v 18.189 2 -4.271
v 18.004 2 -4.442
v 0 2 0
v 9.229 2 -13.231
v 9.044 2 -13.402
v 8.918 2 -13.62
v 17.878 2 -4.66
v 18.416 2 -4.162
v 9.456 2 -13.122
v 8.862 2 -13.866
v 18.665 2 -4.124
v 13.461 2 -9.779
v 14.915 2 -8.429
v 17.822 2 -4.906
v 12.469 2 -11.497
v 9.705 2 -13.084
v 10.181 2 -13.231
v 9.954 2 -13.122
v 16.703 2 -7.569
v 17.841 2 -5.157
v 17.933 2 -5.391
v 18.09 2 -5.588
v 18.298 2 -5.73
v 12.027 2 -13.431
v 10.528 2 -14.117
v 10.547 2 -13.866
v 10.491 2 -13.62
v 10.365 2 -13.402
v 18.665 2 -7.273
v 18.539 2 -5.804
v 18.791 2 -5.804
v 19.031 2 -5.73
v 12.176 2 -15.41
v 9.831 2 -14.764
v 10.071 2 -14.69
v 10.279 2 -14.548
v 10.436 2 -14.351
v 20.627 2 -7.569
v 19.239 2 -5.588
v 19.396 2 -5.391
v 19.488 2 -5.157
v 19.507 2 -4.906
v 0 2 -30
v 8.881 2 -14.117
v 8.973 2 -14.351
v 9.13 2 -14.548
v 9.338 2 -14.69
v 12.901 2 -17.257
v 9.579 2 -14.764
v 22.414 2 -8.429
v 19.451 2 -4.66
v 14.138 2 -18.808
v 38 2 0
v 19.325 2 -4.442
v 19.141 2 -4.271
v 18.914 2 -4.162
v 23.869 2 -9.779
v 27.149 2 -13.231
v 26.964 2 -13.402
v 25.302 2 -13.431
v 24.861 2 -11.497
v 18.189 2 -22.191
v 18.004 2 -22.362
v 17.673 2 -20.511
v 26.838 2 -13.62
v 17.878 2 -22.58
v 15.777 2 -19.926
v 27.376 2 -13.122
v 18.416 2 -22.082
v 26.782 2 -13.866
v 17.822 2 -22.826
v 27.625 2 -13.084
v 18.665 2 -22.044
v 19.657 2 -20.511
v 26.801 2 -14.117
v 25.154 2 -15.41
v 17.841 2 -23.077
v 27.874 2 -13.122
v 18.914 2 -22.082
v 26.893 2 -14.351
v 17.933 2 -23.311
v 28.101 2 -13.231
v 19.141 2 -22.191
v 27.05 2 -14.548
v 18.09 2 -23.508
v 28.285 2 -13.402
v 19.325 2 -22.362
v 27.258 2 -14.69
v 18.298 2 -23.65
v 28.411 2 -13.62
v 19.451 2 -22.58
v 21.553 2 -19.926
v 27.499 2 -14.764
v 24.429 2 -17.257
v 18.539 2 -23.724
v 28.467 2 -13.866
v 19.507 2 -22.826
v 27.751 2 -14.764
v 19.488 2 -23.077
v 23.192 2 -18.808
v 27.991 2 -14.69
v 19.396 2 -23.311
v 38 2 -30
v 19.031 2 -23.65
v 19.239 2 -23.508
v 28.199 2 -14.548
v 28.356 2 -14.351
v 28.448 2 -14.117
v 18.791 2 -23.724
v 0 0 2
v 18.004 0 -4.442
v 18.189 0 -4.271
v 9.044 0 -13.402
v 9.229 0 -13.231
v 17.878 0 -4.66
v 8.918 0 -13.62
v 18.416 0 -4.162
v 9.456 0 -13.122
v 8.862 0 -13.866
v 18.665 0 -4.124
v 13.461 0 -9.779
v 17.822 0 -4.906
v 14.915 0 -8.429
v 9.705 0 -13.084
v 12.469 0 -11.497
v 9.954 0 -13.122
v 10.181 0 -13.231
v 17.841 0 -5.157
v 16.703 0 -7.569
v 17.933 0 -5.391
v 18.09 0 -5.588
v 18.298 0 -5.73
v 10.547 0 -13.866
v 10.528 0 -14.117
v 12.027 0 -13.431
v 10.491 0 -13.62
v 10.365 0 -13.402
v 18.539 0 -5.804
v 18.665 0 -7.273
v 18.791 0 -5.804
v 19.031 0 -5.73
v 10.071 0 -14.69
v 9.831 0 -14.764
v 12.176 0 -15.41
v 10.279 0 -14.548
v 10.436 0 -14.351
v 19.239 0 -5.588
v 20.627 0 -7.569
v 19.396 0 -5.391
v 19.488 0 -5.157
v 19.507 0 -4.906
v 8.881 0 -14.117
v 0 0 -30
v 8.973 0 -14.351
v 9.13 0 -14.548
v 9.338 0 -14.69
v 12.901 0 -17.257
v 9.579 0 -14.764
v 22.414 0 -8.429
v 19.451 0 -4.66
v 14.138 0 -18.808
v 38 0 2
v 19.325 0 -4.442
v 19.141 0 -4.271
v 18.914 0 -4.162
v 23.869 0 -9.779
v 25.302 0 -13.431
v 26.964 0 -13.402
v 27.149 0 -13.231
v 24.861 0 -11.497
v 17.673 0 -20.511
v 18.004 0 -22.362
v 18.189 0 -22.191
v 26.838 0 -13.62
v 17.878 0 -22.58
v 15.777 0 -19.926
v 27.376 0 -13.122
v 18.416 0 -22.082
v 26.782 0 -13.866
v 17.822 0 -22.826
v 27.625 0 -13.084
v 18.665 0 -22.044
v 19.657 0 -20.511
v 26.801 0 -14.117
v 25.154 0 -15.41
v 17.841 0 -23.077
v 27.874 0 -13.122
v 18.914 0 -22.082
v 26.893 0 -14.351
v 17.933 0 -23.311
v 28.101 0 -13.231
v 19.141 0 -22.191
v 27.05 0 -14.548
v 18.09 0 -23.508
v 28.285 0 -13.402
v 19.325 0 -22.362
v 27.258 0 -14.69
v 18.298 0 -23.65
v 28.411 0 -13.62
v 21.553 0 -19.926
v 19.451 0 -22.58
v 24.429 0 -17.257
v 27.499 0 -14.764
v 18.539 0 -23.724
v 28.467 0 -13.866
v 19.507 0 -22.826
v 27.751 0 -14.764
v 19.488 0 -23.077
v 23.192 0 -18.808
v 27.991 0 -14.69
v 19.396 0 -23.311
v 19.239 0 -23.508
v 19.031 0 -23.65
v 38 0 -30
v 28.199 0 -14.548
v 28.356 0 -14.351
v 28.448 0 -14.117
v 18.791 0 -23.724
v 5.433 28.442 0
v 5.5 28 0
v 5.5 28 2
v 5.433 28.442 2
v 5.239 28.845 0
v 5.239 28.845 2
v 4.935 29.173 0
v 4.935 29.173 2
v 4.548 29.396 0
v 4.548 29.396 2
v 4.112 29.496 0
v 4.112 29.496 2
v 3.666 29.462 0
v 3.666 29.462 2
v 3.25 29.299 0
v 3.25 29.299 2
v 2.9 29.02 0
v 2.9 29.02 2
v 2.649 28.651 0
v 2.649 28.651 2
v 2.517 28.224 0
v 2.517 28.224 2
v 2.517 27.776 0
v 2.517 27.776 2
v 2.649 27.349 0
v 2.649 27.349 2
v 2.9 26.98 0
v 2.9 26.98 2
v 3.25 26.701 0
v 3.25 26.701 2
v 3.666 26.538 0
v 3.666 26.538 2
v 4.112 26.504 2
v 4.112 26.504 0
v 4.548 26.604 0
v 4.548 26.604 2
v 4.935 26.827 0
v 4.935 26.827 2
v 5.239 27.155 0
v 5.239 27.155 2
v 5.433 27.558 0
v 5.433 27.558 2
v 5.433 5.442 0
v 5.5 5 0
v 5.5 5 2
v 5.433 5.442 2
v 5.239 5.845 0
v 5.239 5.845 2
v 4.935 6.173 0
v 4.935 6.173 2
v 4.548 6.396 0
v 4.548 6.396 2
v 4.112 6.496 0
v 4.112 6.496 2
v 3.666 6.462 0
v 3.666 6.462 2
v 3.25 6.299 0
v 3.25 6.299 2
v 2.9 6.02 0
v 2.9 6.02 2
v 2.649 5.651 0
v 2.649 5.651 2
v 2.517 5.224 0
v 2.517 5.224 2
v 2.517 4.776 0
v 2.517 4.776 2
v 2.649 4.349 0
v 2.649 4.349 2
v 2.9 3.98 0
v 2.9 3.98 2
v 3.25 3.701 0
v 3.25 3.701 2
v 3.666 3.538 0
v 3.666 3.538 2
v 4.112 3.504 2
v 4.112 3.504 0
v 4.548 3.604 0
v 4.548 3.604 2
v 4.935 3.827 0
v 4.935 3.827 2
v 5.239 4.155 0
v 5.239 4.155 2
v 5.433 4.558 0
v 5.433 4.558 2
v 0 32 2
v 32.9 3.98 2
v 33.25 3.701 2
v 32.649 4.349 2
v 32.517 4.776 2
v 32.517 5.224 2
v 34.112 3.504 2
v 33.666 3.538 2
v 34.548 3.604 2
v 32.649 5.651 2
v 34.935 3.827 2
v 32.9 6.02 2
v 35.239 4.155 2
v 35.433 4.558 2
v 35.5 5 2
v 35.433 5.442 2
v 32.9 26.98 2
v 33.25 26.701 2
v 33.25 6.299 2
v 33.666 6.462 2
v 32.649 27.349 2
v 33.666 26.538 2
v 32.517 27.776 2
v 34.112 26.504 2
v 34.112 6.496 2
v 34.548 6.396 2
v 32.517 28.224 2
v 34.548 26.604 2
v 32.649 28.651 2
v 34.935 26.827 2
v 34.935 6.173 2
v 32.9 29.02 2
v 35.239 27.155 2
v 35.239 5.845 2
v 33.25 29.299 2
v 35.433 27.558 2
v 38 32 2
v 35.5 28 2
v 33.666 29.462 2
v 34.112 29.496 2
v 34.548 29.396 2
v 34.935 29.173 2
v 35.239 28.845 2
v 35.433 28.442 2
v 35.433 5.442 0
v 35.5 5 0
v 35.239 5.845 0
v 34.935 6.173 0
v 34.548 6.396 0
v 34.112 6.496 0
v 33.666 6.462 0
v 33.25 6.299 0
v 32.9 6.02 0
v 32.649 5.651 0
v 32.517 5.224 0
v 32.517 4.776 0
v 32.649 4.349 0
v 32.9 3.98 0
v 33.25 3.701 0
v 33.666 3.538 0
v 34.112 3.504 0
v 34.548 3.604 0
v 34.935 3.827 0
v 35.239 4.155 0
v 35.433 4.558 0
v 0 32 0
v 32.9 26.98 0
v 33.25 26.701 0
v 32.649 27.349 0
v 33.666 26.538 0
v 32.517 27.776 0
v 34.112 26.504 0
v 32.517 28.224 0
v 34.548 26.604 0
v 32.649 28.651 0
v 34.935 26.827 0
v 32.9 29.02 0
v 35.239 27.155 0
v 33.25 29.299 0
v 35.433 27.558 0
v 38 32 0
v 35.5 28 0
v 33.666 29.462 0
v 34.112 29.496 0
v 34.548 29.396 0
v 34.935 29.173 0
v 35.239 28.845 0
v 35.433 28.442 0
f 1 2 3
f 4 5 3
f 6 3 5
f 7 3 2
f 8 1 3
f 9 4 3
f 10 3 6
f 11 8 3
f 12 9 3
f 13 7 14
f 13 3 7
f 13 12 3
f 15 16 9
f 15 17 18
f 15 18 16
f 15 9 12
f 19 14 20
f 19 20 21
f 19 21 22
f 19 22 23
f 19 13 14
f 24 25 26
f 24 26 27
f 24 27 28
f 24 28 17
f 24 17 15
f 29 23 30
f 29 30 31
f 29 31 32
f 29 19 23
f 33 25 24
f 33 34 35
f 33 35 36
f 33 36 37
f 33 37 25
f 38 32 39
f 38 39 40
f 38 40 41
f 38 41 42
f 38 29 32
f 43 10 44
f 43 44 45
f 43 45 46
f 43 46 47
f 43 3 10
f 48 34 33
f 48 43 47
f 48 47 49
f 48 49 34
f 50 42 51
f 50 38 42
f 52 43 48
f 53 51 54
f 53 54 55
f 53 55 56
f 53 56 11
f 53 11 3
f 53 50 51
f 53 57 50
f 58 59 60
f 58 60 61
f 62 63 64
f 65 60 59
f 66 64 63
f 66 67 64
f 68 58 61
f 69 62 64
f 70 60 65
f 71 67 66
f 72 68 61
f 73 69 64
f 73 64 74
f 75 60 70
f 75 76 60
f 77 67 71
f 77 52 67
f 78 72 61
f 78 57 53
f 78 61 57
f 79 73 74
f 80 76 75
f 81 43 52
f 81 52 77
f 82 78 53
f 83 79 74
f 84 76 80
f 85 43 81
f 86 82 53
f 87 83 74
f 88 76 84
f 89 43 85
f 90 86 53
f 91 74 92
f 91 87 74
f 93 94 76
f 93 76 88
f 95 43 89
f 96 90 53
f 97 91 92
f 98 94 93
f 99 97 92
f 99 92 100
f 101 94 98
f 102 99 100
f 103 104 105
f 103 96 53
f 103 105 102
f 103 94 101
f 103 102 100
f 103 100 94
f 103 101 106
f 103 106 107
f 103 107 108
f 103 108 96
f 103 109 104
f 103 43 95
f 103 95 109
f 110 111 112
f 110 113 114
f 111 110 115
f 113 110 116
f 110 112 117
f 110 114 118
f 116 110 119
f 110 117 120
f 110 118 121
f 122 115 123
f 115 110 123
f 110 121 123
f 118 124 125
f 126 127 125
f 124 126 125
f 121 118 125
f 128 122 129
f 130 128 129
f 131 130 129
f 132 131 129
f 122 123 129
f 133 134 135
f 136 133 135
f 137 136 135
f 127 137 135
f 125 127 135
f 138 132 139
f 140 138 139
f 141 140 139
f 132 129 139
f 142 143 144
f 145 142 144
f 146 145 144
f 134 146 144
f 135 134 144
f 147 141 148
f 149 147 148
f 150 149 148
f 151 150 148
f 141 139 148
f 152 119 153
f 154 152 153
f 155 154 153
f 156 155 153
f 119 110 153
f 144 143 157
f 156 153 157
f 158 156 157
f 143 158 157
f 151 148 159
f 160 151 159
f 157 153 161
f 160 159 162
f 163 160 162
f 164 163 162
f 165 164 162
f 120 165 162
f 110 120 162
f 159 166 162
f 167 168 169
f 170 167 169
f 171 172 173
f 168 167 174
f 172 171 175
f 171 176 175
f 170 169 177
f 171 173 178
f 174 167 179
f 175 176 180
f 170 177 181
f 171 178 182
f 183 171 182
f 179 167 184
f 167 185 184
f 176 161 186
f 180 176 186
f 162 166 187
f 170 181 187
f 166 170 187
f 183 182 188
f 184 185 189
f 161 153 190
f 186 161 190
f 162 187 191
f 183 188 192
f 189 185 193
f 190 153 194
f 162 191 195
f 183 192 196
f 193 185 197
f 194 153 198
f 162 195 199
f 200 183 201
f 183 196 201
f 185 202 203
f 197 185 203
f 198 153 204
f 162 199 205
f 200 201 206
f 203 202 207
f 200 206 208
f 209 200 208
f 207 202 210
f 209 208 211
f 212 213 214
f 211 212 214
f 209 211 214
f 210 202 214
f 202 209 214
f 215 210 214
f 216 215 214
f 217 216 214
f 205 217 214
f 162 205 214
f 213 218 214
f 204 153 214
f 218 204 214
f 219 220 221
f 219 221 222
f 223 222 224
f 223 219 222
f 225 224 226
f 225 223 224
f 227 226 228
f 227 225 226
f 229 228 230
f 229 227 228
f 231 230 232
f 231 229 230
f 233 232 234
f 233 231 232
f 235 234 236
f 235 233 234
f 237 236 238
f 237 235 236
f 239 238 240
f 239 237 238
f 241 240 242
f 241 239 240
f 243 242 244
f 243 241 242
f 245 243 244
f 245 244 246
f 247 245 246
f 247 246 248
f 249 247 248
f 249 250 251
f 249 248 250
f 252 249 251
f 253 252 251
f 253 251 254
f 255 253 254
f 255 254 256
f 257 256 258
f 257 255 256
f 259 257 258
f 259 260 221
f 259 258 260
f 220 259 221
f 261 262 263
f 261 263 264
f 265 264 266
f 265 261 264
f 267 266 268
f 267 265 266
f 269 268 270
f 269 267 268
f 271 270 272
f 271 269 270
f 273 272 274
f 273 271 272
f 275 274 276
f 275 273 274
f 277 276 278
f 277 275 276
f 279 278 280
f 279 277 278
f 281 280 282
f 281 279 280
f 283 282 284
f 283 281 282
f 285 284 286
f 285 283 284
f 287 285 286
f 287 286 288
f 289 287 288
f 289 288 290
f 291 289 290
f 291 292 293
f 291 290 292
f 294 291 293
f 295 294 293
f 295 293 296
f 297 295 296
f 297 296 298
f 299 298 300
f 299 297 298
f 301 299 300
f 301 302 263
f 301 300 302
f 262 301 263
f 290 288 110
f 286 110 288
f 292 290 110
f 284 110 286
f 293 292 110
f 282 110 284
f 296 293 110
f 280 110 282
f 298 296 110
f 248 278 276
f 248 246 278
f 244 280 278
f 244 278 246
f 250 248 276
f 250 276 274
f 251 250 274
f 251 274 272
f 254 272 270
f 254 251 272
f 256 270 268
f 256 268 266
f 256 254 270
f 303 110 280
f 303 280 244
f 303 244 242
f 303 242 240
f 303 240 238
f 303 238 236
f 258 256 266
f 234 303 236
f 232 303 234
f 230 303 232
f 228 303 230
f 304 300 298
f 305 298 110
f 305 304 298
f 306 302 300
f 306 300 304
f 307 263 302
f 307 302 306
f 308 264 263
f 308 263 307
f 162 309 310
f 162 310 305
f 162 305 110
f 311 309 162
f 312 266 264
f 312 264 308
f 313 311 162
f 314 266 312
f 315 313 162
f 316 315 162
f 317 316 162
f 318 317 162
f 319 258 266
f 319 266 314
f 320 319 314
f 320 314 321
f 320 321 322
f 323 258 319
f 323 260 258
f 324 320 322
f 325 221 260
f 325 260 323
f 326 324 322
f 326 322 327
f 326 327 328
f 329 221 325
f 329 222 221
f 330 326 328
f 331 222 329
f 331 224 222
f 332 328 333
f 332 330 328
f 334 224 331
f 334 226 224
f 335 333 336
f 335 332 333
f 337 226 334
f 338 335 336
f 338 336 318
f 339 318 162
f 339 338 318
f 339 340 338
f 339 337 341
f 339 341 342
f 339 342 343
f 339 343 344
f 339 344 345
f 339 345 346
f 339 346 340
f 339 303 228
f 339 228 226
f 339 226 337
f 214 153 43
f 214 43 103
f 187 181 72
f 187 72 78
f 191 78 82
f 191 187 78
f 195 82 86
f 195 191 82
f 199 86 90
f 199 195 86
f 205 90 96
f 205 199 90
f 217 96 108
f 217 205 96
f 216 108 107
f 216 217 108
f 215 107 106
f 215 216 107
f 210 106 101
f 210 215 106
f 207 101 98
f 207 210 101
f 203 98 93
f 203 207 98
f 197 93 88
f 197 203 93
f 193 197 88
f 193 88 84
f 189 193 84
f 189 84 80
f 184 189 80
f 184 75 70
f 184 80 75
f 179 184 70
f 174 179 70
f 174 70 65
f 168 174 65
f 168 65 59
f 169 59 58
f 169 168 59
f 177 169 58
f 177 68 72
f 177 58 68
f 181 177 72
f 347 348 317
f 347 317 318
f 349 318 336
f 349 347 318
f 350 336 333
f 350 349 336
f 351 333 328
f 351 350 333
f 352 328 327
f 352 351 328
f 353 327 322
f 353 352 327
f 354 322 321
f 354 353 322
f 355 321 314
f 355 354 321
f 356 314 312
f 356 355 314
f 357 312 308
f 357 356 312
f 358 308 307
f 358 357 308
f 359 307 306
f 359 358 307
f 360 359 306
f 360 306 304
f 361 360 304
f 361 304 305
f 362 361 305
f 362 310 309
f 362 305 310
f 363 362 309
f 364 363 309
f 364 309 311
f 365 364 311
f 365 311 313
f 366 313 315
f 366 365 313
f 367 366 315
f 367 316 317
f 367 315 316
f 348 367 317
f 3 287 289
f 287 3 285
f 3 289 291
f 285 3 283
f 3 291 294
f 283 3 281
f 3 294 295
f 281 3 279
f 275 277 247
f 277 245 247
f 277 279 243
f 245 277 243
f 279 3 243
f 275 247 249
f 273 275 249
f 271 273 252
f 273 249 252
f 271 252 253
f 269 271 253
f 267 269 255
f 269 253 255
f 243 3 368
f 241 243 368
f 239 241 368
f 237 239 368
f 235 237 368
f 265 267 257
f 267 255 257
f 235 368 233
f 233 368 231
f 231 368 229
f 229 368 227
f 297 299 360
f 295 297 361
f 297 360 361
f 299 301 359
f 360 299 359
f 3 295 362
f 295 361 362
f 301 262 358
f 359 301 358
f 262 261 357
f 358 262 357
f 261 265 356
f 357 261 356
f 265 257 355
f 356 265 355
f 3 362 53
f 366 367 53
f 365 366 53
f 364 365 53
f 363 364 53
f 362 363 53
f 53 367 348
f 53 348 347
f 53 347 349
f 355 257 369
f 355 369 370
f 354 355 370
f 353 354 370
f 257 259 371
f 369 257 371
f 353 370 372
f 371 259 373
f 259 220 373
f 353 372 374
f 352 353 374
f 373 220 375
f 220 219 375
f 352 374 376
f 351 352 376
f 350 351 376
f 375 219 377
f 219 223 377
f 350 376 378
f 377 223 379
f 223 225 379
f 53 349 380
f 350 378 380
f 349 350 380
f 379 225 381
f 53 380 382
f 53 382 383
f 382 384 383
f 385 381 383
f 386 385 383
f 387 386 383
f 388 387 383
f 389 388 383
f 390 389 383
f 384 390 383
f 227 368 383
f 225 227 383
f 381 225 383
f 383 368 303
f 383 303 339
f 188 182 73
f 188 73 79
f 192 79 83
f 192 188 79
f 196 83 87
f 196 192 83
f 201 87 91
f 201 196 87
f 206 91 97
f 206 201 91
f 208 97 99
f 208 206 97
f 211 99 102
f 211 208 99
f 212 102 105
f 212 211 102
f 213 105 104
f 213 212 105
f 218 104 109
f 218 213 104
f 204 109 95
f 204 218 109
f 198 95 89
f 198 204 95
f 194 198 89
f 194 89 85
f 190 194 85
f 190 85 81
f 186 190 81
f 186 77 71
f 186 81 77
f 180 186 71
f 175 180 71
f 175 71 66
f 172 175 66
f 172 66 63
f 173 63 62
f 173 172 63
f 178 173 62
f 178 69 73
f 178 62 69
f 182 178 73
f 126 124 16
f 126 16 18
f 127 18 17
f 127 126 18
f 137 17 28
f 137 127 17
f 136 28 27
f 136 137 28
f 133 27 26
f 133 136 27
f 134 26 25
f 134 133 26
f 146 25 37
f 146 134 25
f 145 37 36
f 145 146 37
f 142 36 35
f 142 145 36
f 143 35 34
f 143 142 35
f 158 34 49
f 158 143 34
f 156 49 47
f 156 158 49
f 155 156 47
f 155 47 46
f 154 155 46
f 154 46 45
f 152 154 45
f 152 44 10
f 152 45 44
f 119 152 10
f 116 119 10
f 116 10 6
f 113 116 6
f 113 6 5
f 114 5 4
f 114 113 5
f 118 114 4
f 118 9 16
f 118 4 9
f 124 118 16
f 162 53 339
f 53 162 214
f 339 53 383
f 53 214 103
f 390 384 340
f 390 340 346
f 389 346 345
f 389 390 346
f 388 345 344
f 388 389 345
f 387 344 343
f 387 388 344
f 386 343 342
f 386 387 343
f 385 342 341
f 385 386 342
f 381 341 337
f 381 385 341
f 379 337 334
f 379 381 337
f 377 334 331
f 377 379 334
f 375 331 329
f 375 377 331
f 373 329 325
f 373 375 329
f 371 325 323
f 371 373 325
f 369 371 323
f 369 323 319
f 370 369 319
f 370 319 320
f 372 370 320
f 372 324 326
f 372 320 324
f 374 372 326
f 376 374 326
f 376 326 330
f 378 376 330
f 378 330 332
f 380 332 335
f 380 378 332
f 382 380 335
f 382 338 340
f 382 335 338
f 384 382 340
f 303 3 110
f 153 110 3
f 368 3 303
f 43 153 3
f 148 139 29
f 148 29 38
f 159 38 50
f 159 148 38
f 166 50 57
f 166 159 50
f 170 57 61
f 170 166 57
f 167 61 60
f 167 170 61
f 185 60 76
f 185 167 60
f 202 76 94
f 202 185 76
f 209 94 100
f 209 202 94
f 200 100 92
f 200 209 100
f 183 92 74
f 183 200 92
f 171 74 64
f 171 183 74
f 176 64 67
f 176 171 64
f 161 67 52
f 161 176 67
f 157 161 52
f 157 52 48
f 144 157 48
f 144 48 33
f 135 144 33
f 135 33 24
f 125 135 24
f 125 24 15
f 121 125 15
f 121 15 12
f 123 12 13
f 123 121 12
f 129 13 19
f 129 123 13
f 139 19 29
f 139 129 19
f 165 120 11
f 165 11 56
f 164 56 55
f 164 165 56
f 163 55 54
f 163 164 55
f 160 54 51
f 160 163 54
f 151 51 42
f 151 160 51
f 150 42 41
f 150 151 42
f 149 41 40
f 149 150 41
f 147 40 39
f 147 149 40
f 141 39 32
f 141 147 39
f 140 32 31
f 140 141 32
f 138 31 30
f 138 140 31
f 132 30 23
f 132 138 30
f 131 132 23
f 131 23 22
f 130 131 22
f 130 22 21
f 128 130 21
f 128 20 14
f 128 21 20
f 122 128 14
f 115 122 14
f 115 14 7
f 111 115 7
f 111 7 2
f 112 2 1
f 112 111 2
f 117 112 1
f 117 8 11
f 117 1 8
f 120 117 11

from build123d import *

# Parameters (mm, degrees)
SKETCH_3_W               = 38
SKETCH_3_H               = 32
EXTRUDE_330_DEPTH        = 2
SKETCH_4_W               = 38
SKETCH_4_H               = 32
EXTRUDE_444_DEPTH        = 2
CUT_EXTRUDE_1_DEPTH      = 59.034472514
CUT_EXTRUDE_1_DEPTH_BACK = 59.034472514
SKETCH_5_R               = 1.5
CUT_EXTRUDE_2_DEPTH      = 59.034472514
CUT_EXTRUDE_2_DEPTH_BACK = 59.034472514
SKETCH_6_R               = 6.656
SKETCH_6_R_2             = 0.8448


with BuildPart() as part:
    # 草图3 → Extrude 330 (new body)
    with BuildSketch(Plane.XY):
        with Locations((19, 16)):
            Rectangle(SKETCH_3_W, SKETCH_3_H)
    extrude(amount=EXTRUDE_330_DEPTH)

    # 草图4 → Extrude 444 (add)
    with BuildSketch(Plane(origin=(0, 0, 0), x_dir=(1, 0, 0), z_dir=(0, 1, 0))):
        with Locations((19, 14)):
            Rectangle(SKETCH_4_W, SKETCH_4_H)
    extrude(amount=EXTRUDE_444_DEPTH)

    # 草图5 → 切除-拉伸1 (cut, two sides: drawn at the far end of the back side and taken through both)
    with BuildSketch(Plane.XY.offset(-CUT_EXTRUDE_1_DEPTH_BACK)):
        with Locations((4, 5)):
            Circle(SKETCH_5_R)
        with Locations((4, 28)):
            Circle(SKETCH_5_R)
        with Locations((34, 5)):
            Circle(SKETCH_5_R)
        with Locations((34, 28)):
            Circle(SKETCH_5_R)
    extrude(amount=CUT_EXTRUDE_1_DEPTH + CUT_EXTRUDE_1_DEPTH_BACK, mode=Mode.SUBTRACT)

    # 草图6 → 切除-拉伸2 (cut, two sides: drawn at the far end of the back side and taken through both)
    with BuildSketch(Plane(origin=(0, 0, 0), x_dir=(1, 0, 0), z_dir=(0, 1, 0)).offset(-CUT_EXTRUDE_2_DEPTH_BACK)):
        with Locations(Location((18.664843729, 13.928843729, 0), (0, 0, 270))):
            Circle(SKETCH_6_R)
        with Locations(Location((9.704843729, 13.928843729, 0), (0, 0, 270))):
            Circle(SKETCH_6_R_2)
        with Locations(Location((18.664843729, 22.888843729, 0), (0, 0, 270))):
            Circle(SKETCH_6_R_2)
        with Locations(Location((27.624843729, 13.928843729, 0), (0, 0, 270))):
            Circle(SKETCH_6_R_2)
        with Locations(Location((18.664843729, 4.968843729, 0), (0, 0, 270))):
            Circle(SKETCH_6_R_2)
    extrude(amount=CUT_EXTRUDE_2_DEPTH + CUT_EXTRUDE_2_DEPTH_BACK, mode=Mode.SUBTRACT)


solid = part.part
